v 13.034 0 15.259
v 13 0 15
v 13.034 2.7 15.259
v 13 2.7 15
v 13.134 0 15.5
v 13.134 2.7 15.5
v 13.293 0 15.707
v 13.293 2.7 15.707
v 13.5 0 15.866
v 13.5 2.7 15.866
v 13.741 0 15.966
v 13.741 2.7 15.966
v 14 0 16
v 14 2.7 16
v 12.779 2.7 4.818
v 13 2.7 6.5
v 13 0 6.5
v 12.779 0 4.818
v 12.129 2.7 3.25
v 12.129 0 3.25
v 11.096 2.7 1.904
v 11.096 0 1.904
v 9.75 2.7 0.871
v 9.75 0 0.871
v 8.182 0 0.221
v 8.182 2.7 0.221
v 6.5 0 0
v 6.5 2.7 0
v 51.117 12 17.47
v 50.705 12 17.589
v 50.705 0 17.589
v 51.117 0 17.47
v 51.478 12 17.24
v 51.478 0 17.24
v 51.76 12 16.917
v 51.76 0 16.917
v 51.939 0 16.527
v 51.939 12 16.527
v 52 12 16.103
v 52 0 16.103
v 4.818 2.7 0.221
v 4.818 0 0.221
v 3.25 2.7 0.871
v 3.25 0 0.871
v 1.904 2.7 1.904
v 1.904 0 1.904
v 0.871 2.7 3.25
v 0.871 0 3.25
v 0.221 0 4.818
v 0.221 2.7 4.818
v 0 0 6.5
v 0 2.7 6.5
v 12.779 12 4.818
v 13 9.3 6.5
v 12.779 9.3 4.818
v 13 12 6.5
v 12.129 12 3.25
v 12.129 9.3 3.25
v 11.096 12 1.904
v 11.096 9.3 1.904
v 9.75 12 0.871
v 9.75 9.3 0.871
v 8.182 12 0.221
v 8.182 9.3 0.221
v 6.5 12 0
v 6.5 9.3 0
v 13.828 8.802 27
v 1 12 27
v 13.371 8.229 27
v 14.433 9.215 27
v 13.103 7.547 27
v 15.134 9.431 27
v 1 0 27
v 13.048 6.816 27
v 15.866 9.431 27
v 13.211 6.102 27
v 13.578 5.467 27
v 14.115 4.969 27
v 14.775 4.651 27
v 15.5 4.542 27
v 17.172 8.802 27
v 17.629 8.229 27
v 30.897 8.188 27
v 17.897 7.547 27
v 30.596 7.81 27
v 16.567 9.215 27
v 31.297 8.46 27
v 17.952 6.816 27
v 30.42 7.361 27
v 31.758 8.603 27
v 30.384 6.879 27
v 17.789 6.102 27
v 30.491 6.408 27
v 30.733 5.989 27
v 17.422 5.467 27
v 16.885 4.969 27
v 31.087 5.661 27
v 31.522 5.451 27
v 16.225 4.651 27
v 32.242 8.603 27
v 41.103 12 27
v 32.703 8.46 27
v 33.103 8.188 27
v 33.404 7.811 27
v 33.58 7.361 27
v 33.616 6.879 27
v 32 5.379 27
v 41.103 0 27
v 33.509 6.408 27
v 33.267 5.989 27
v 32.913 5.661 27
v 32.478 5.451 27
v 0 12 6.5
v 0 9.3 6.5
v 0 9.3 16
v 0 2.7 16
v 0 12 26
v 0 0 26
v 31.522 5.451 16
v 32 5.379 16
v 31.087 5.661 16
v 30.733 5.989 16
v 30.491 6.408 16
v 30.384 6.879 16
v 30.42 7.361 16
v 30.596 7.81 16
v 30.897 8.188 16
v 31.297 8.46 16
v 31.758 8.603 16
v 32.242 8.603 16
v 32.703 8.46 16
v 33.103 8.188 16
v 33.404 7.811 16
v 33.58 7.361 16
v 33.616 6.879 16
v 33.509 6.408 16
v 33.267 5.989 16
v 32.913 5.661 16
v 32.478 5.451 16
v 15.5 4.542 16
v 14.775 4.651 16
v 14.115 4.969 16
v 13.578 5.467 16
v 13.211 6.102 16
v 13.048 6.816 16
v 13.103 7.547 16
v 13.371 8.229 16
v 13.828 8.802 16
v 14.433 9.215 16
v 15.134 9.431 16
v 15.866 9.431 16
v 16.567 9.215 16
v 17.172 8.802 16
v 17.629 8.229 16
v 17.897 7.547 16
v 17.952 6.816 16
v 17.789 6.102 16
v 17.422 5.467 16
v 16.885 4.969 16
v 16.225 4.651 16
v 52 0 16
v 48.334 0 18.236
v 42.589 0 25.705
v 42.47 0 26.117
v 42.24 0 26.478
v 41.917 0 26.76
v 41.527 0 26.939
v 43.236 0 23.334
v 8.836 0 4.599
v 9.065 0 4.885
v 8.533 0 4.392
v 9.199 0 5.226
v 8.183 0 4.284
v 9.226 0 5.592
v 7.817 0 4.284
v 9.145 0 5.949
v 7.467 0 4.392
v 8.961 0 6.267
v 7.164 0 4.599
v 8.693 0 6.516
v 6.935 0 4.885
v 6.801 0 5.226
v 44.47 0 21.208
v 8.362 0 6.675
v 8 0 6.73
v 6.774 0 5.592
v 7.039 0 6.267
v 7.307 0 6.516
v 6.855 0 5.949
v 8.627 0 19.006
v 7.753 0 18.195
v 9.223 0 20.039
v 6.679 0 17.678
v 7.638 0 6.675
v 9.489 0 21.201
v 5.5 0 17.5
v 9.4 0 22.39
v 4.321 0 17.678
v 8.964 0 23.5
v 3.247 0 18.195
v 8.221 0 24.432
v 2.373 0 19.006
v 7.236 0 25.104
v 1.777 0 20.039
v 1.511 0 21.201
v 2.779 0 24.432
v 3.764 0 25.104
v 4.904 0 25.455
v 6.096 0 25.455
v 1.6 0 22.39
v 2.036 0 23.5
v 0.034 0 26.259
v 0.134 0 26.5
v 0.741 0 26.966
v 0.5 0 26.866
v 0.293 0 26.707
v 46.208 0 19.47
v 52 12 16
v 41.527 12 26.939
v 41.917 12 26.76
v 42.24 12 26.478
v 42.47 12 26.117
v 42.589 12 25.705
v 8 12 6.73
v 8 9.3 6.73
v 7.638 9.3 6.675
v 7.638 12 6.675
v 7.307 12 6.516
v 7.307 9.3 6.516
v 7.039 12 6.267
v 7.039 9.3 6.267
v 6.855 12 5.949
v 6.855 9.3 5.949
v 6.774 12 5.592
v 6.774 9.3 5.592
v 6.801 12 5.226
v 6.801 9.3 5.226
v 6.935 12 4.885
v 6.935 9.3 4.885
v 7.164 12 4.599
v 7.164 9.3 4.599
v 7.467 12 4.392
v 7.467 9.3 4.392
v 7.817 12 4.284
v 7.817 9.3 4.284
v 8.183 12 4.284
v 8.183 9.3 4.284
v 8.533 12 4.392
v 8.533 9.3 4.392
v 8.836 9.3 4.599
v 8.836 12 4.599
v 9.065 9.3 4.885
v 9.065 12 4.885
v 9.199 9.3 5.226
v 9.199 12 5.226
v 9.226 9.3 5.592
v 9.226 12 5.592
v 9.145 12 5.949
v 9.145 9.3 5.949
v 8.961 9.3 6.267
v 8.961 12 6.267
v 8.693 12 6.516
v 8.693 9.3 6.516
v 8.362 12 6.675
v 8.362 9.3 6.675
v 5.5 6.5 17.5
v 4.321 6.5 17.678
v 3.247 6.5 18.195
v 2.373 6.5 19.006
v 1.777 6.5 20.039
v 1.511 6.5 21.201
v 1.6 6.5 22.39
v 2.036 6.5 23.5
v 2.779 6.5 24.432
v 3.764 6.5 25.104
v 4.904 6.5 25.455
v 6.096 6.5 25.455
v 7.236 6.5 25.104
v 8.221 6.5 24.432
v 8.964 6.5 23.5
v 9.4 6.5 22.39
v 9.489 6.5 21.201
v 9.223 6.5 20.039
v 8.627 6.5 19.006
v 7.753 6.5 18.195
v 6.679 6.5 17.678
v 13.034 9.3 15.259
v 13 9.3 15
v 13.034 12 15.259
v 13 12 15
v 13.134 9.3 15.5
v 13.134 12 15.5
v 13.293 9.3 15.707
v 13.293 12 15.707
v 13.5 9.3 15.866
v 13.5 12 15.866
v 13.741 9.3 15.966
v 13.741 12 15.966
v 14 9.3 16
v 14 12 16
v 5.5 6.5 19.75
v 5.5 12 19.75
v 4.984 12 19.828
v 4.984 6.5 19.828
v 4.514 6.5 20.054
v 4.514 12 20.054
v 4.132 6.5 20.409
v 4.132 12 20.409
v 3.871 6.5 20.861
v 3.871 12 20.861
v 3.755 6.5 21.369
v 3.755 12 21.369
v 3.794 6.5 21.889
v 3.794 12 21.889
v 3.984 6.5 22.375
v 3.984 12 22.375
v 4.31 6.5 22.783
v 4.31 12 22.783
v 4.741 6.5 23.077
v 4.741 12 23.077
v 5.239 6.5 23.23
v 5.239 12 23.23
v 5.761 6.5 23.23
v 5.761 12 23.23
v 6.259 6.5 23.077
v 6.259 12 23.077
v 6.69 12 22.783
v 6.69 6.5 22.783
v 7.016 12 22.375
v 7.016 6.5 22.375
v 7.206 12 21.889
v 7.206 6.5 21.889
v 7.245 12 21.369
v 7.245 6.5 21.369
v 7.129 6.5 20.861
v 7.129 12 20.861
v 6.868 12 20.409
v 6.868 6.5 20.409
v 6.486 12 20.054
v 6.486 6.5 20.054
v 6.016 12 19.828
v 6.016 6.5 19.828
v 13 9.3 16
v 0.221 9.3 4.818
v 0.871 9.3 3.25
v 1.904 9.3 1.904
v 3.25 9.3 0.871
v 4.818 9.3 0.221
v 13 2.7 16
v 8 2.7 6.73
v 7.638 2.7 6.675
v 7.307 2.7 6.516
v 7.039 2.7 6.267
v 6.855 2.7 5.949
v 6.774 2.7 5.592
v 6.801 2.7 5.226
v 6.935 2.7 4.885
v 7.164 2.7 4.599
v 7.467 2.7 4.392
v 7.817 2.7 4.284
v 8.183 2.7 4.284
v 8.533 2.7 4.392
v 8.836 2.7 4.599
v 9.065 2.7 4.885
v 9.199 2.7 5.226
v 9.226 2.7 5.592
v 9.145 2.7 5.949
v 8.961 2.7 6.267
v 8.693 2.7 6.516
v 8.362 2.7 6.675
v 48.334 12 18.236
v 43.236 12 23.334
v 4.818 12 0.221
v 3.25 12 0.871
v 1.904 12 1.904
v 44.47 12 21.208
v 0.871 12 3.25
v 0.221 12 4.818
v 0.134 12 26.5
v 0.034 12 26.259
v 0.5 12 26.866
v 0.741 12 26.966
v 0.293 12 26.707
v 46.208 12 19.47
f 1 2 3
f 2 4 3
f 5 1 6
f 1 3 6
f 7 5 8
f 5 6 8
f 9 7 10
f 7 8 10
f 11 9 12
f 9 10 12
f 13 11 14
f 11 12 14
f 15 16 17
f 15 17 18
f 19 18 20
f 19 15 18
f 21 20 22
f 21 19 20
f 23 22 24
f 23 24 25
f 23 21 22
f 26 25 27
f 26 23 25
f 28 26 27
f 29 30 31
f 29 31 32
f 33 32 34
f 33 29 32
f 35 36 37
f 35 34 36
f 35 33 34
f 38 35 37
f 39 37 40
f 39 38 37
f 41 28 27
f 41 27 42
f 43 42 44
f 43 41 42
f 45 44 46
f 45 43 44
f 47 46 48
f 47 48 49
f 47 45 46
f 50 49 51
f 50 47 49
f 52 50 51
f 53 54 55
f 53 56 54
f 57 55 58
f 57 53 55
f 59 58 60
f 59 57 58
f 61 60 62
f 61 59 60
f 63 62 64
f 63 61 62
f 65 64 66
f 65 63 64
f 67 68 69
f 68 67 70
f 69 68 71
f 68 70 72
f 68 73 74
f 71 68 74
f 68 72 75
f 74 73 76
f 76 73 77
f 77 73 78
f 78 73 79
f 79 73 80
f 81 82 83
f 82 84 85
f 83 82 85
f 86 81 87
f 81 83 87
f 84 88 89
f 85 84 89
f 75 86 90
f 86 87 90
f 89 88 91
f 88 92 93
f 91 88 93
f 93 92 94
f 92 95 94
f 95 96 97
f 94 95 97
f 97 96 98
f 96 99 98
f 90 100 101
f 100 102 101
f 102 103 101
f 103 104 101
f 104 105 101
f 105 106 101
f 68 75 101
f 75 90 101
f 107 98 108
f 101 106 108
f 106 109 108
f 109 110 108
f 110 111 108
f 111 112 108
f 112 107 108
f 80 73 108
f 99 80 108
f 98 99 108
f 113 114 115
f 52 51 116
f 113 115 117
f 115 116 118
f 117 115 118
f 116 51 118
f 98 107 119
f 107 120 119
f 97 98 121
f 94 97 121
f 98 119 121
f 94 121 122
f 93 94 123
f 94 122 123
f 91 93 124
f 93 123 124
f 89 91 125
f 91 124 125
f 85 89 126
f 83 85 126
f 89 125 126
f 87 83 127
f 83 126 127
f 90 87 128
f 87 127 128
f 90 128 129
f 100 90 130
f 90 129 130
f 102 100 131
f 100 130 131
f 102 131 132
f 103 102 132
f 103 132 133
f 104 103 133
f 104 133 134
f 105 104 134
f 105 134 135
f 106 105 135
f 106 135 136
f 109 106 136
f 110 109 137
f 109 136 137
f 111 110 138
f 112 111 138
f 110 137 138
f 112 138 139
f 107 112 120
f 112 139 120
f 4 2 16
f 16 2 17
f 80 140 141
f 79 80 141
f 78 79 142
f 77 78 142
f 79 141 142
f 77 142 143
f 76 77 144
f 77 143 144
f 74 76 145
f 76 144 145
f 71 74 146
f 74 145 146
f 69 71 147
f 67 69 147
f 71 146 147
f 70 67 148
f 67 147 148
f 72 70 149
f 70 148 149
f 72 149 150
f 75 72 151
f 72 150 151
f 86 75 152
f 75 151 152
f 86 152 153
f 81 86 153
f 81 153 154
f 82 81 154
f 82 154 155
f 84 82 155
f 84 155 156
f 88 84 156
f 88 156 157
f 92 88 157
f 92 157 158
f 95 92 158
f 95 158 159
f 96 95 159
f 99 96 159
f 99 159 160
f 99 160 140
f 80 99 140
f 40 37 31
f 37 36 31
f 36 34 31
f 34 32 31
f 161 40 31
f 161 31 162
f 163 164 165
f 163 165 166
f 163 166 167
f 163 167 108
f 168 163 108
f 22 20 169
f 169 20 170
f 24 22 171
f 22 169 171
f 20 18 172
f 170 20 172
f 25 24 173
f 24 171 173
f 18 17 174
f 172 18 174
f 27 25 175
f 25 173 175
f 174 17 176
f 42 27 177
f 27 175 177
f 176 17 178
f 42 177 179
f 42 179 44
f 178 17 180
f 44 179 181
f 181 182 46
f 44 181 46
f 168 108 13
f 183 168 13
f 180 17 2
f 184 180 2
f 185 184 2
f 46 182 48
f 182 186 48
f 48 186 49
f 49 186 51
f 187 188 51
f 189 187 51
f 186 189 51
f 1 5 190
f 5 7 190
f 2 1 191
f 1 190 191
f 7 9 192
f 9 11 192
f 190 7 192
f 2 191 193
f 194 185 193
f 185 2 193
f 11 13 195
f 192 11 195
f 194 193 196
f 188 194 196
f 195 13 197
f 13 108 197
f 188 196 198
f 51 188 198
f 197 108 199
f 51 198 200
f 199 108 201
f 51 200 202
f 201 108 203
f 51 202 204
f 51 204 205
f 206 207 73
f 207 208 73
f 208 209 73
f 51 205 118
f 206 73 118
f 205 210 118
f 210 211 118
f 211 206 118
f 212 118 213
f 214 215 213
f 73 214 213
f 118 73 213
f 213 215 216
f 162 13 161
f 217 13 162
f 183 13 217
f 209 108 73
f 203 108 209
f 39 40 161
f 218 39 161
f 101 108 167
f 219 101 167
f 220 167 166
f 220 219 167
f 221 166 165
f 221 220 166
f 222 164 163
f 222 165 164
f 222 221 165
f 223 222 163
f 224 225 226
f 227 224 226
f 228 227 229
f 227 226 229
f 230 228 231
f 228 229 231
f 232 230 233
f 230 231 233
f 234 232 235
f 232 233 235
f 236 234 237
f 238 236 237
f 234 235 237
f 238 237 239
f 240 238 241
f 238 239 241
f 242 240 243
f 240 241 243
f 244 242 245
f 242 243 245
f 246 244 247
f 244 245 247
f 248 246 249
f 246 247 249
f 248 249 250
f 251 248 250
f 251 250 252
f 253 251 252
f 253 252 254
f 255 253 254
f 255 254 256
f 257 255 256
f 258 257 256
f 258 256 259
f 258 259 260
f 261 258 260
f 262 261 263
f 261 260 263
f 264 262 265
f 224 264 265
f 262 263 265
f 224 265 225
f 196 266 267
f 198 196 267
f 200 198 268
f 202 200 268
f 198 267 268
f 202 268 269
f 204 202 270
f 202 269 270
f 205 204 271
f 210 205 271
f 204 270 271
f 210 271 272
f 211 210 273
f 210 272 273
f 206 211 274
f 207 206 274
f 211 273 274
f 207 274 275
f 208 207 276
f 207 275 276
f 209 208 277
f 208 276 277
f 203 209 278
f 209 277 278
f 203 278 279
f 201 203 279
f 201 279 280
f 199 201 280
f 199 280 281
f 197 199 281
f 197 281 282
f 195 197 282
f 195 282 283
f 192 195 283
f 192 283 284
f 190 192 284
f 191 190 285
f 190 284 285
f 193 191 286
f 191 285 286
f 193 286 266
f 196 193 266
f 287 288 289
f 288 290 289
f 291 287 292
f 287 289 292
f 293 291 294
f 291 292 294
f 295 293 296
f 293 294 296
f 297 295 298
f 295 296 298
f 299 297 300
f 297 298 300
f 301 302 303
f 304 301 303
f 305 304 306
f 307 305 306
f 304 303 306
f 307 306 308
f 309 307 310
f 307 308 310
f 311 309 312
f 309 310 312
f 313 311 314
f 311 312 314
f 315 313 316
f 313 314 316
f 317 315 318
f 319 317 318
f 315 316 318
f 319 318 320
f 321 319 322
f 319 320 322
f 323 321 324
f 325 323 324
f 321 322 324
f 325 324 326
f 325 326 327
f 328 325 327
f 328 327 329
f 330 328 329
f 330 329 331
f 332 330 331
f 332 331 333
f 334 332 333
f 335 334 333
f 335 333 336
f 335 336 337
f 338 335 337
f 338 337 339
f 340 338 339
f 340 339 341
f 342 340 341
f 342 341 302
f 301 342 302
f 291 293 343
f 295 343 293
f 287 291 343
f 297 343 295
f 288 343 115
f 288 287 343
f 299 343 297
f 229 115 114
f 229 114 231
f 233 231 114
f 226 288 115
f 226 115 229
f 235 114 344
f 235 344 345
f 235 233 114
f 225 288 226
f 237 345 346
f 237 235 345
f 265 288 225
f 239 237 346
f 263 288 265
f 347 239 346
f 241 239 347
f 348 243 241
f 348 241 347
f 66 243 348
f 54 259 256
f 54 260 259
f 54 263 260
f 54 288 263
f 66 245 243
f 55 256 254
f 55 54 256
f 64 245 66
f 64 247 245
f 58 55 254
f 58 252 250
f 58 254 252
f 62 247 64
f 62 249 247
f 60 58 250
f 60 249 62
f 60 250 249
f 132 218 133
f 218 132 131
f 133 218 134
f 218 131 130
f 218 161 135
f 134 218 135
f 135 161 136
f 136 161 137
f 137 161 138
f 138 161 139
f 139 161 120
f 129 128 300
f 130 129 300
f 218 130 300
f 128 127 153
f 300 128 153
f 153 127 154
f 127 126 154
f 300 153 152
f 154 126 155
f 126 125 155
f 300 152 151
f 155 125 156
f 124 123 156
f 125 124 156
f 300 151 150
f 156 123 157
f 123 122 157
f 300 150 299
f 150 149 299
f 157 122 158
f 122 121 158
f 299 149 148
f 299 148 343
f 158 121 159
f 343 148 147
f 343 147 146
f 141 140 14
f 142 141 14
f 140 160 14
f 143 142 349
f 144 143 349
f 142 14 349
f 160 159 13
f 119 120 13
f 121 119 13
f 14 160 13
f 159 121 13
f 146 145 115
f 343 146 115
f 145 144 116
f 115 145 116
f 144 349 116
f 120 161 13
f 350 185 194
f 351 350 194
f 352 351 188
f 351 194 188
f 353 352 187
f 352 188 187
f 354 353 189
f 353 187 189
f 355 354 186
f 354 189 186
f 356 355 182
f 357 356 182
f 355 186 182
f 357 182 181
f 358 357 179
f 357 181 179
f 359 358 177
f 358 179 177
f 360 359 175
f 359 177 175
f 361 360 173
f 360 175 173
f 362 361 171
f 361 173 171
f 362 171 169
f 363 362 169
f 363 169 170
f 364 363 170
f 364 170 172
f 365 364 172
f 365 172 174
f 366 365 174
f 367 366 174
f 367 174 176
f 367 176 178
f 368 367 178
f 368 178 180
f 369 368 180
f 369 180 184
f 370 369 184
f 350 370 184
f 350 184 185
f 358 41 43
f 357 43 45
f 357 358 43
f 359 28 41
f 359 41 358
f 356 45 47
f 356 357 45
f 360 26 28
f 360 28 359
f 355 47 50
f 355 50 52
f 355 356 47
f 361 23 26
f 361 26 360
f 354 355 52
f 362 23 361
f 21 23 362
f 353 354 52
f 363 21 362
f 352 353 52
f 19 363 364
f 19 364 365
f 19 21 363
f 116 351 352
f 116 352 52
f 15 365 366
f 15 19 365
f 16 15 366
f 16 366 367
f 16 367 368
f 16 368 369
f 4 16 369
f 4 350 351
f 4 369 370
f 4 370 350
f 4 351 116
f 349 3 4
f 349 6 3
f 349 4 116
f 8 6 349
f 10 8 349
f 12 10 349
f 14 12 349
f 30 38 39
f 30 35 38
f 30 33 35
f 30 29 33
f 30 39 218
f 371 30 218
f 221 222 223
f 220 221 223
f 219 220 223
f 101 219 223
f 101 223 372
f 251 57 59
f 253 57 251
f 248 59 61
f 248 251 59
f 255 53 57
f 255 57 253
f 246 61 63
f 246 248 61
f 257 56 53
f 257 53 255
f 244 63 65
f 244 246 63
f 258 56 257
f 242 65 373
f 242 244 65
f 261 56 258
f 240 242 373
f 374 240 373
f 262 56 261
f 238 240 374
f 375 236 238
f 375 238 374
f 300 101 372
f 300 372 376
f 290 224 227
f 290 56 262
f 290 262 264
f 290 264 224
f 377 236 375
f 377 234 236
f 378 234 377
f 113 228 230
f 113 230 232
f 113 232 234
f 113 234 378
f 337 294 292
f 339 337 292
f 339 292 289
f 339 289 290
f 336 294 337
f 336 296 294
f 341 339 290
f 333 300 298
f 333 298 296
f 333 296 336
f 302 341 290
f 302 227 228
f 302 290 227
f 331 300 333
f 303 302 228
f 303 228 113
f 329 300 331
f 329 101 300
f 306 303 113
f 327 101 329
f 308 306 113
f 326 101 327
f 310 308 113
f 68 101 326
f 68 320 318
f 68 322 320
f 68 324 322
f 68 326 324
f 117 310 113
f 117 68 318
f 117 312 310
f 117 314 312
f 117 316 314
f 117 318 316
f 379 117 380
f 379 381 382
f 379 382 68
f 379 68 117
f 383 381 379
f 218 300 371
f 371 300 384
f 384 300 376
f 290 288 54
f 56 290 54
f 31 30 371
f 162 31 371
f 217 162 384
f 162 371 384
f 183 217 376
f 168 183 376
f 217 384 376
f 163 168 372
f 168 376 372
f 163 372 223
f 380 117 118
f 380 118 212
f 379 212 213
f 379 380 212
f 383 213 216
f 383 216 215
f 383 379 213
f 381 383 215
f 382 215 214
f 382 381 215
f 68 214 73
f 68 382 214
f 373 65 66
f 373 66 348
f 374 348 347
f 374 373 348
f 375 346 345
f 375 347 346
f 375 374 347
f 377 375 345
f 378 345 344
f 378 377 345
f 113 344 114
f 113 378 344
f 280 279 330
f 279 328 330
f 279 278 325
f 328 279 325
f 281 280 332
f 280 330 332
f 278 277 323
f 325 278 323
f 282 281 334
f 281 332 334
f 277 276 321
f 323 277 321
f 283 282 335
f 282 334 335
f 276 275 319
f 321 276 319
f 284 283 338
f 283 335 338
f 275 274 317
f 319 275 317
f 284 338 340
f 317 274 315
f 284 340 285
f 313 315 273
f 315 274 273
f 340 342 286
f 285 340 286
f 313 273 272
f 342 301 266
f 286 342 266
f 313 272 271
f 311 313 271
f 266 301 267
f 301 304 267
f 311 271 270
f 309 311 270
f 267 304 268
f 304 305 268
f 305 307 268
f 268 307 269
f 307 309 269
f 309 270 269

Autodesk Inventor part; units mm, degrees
ref_plane "YZ Plane" through (0, 0, 0) normal (1, 0, 0) x (0, 1, 0)
ref_plane "XZ Plane" through (0, 0, 0) normal (0, 1, 0) x (-1, 0, 0)
ref_plane "XY Plane" through (0, 0, 0) normal (0, 0, 1) x (1, 0, 0)
sketch "Sketch1" plane through (0, 0, 0) normal (0, 1, 0) x (-1, 0, 0)
  line L0 (0, 0) -> (0, 27)
  line L1 (0, 27) -> (-52, 27)
  line L2 (-52, 27) -> (-52, 16)
  line L3 (-52, 16) -> (-13, 16)
  line L4 (-13, 16) -> (-13, 0)
  line L5 (-13, 0) -> (0, 0)
  dimension "d0" = 27
  dimension "d1" = 52
  dimension "d2" = 11
  dimension "d3" = 39
  dimension "d57" = 16
extrude "Extrusion1" add sketch "Sketch1" along normal blind 12
sketch "Sketch2" plane through (0, 0, 0) normal (0, -1, 0) x (1, 0, 0)
  line L0 (0, 0) -> (0, 27) projected
  line L1 (0, 27) -> (52, 27) projected
  point P0 (5.5, 21.5)
  dimension "d6" = 5.5
  dimension "d7" = 5.5
hole "Hole1" at (5.5, 0, 21.5) direction (0, 1, 0) diameter 3.5 end through all counterbore diameter 8 counterbore depth 6.5
sketch "Sketch3" plane through (0, 12, 0) normal (0, 1, 0) x (1, 0, 0)
  line L0 (0, 0) -> (0, -27) projected
  line L1 (13, 0) -> (0, 0) projected
  point P0 (8, -5.5)
  dimension "d15" = 8
  dimension "d16" = 5.5
hole "Hole2" at (8, 12, 5.5) direction (0, -1, 0) diameter 2.459 end through all thread size "M3x0.5" class "6H" standard "ISO Metric profile"
sketch "Sketch4" plane through (13, 0, 16) normal (1, 0, 0) x (0, 0, -1)
  line L0 (0, 0) -> (0, 12) projected
  line L1 (16, 2.7) -> (0, 2.7)
  line L2 (0, 2.7) -> (0, 9.3)
  line L3 (0, 9.3) -> (16, 9.3)
  line L4 (16, 9.3) -> (16, 2.7)
  line L5 (0, 0) -> (16, 0) projected
  line L6 (0, 12) -> (16, 12) projected
  dimension "d58" = 12
  dimension "d59" = 6.6
  dimension "d60" = 2.7
extrude "Extrusion2" cut sketch "Sketch4" against normal through all
sketch "Sketch5" plane through (0, 0, 27) normal (0, 0, 1) x (1, 0, 0)
  line L0 (0, 0) -> (52, 0) projected
  line L1 (0, 0) -> (0, 12) projected
  point P0 (15.5, 7)
  dimension "d28" = 7
  dimension "d29" = 15.5
hole "Hole3" at (15.5, 7, 27) direction (0, 0, -1) diameter 4.917 end through all thread size "M6x1" class "6H" standard "ISO Metric profile"
sketch "Sketch6" plane through (0, 0, 27) normal (0, 0, 1) x (1, 0, 0)
  line L0 (0, 0) -> (52, 0) projected
  line L1 (0, 0) -> (0, 12) projected
  point P0 (32, 7)
  dimension "d37" = 7
  dimension "d38" = 32
hole "Hole4" at (32, 7, 27) direction (0, 0, -1) diameter 3.242 end through all thread size "M4x0.7" class "6H" standard "ISO Metric profile"
sketch "Sketch7" plane through (0, 0, 0) normal (0, -1, 0) x (1, 0, 0)
  line L0 (0, 27) -> (52, 27) projected
  point P0 (0, 0)
hole "Hole5" at (52, 0, 27) direction (0, 1, 0) diameter 19 end through all
fillet "Fillet1" radius 1.5 2 edges at (42.5, 6, 27) (52, 6, 17.5)
fillet "Fillet2" radius 6.5 4 edges at (13, 1.35, 0) (13, 10.65, 0) (0, 10.65, 0) (0, 1.35, 0)
fillet "Fillet3" radius 1 1 edges at (0, 6, 27)
fillet "Fillet4" radius 1 2 edges at (13, 1.35, 16) (13, 10.65, 16)
equation "\"d60\" = -0.5 * d59 + 0.5 * d58"
